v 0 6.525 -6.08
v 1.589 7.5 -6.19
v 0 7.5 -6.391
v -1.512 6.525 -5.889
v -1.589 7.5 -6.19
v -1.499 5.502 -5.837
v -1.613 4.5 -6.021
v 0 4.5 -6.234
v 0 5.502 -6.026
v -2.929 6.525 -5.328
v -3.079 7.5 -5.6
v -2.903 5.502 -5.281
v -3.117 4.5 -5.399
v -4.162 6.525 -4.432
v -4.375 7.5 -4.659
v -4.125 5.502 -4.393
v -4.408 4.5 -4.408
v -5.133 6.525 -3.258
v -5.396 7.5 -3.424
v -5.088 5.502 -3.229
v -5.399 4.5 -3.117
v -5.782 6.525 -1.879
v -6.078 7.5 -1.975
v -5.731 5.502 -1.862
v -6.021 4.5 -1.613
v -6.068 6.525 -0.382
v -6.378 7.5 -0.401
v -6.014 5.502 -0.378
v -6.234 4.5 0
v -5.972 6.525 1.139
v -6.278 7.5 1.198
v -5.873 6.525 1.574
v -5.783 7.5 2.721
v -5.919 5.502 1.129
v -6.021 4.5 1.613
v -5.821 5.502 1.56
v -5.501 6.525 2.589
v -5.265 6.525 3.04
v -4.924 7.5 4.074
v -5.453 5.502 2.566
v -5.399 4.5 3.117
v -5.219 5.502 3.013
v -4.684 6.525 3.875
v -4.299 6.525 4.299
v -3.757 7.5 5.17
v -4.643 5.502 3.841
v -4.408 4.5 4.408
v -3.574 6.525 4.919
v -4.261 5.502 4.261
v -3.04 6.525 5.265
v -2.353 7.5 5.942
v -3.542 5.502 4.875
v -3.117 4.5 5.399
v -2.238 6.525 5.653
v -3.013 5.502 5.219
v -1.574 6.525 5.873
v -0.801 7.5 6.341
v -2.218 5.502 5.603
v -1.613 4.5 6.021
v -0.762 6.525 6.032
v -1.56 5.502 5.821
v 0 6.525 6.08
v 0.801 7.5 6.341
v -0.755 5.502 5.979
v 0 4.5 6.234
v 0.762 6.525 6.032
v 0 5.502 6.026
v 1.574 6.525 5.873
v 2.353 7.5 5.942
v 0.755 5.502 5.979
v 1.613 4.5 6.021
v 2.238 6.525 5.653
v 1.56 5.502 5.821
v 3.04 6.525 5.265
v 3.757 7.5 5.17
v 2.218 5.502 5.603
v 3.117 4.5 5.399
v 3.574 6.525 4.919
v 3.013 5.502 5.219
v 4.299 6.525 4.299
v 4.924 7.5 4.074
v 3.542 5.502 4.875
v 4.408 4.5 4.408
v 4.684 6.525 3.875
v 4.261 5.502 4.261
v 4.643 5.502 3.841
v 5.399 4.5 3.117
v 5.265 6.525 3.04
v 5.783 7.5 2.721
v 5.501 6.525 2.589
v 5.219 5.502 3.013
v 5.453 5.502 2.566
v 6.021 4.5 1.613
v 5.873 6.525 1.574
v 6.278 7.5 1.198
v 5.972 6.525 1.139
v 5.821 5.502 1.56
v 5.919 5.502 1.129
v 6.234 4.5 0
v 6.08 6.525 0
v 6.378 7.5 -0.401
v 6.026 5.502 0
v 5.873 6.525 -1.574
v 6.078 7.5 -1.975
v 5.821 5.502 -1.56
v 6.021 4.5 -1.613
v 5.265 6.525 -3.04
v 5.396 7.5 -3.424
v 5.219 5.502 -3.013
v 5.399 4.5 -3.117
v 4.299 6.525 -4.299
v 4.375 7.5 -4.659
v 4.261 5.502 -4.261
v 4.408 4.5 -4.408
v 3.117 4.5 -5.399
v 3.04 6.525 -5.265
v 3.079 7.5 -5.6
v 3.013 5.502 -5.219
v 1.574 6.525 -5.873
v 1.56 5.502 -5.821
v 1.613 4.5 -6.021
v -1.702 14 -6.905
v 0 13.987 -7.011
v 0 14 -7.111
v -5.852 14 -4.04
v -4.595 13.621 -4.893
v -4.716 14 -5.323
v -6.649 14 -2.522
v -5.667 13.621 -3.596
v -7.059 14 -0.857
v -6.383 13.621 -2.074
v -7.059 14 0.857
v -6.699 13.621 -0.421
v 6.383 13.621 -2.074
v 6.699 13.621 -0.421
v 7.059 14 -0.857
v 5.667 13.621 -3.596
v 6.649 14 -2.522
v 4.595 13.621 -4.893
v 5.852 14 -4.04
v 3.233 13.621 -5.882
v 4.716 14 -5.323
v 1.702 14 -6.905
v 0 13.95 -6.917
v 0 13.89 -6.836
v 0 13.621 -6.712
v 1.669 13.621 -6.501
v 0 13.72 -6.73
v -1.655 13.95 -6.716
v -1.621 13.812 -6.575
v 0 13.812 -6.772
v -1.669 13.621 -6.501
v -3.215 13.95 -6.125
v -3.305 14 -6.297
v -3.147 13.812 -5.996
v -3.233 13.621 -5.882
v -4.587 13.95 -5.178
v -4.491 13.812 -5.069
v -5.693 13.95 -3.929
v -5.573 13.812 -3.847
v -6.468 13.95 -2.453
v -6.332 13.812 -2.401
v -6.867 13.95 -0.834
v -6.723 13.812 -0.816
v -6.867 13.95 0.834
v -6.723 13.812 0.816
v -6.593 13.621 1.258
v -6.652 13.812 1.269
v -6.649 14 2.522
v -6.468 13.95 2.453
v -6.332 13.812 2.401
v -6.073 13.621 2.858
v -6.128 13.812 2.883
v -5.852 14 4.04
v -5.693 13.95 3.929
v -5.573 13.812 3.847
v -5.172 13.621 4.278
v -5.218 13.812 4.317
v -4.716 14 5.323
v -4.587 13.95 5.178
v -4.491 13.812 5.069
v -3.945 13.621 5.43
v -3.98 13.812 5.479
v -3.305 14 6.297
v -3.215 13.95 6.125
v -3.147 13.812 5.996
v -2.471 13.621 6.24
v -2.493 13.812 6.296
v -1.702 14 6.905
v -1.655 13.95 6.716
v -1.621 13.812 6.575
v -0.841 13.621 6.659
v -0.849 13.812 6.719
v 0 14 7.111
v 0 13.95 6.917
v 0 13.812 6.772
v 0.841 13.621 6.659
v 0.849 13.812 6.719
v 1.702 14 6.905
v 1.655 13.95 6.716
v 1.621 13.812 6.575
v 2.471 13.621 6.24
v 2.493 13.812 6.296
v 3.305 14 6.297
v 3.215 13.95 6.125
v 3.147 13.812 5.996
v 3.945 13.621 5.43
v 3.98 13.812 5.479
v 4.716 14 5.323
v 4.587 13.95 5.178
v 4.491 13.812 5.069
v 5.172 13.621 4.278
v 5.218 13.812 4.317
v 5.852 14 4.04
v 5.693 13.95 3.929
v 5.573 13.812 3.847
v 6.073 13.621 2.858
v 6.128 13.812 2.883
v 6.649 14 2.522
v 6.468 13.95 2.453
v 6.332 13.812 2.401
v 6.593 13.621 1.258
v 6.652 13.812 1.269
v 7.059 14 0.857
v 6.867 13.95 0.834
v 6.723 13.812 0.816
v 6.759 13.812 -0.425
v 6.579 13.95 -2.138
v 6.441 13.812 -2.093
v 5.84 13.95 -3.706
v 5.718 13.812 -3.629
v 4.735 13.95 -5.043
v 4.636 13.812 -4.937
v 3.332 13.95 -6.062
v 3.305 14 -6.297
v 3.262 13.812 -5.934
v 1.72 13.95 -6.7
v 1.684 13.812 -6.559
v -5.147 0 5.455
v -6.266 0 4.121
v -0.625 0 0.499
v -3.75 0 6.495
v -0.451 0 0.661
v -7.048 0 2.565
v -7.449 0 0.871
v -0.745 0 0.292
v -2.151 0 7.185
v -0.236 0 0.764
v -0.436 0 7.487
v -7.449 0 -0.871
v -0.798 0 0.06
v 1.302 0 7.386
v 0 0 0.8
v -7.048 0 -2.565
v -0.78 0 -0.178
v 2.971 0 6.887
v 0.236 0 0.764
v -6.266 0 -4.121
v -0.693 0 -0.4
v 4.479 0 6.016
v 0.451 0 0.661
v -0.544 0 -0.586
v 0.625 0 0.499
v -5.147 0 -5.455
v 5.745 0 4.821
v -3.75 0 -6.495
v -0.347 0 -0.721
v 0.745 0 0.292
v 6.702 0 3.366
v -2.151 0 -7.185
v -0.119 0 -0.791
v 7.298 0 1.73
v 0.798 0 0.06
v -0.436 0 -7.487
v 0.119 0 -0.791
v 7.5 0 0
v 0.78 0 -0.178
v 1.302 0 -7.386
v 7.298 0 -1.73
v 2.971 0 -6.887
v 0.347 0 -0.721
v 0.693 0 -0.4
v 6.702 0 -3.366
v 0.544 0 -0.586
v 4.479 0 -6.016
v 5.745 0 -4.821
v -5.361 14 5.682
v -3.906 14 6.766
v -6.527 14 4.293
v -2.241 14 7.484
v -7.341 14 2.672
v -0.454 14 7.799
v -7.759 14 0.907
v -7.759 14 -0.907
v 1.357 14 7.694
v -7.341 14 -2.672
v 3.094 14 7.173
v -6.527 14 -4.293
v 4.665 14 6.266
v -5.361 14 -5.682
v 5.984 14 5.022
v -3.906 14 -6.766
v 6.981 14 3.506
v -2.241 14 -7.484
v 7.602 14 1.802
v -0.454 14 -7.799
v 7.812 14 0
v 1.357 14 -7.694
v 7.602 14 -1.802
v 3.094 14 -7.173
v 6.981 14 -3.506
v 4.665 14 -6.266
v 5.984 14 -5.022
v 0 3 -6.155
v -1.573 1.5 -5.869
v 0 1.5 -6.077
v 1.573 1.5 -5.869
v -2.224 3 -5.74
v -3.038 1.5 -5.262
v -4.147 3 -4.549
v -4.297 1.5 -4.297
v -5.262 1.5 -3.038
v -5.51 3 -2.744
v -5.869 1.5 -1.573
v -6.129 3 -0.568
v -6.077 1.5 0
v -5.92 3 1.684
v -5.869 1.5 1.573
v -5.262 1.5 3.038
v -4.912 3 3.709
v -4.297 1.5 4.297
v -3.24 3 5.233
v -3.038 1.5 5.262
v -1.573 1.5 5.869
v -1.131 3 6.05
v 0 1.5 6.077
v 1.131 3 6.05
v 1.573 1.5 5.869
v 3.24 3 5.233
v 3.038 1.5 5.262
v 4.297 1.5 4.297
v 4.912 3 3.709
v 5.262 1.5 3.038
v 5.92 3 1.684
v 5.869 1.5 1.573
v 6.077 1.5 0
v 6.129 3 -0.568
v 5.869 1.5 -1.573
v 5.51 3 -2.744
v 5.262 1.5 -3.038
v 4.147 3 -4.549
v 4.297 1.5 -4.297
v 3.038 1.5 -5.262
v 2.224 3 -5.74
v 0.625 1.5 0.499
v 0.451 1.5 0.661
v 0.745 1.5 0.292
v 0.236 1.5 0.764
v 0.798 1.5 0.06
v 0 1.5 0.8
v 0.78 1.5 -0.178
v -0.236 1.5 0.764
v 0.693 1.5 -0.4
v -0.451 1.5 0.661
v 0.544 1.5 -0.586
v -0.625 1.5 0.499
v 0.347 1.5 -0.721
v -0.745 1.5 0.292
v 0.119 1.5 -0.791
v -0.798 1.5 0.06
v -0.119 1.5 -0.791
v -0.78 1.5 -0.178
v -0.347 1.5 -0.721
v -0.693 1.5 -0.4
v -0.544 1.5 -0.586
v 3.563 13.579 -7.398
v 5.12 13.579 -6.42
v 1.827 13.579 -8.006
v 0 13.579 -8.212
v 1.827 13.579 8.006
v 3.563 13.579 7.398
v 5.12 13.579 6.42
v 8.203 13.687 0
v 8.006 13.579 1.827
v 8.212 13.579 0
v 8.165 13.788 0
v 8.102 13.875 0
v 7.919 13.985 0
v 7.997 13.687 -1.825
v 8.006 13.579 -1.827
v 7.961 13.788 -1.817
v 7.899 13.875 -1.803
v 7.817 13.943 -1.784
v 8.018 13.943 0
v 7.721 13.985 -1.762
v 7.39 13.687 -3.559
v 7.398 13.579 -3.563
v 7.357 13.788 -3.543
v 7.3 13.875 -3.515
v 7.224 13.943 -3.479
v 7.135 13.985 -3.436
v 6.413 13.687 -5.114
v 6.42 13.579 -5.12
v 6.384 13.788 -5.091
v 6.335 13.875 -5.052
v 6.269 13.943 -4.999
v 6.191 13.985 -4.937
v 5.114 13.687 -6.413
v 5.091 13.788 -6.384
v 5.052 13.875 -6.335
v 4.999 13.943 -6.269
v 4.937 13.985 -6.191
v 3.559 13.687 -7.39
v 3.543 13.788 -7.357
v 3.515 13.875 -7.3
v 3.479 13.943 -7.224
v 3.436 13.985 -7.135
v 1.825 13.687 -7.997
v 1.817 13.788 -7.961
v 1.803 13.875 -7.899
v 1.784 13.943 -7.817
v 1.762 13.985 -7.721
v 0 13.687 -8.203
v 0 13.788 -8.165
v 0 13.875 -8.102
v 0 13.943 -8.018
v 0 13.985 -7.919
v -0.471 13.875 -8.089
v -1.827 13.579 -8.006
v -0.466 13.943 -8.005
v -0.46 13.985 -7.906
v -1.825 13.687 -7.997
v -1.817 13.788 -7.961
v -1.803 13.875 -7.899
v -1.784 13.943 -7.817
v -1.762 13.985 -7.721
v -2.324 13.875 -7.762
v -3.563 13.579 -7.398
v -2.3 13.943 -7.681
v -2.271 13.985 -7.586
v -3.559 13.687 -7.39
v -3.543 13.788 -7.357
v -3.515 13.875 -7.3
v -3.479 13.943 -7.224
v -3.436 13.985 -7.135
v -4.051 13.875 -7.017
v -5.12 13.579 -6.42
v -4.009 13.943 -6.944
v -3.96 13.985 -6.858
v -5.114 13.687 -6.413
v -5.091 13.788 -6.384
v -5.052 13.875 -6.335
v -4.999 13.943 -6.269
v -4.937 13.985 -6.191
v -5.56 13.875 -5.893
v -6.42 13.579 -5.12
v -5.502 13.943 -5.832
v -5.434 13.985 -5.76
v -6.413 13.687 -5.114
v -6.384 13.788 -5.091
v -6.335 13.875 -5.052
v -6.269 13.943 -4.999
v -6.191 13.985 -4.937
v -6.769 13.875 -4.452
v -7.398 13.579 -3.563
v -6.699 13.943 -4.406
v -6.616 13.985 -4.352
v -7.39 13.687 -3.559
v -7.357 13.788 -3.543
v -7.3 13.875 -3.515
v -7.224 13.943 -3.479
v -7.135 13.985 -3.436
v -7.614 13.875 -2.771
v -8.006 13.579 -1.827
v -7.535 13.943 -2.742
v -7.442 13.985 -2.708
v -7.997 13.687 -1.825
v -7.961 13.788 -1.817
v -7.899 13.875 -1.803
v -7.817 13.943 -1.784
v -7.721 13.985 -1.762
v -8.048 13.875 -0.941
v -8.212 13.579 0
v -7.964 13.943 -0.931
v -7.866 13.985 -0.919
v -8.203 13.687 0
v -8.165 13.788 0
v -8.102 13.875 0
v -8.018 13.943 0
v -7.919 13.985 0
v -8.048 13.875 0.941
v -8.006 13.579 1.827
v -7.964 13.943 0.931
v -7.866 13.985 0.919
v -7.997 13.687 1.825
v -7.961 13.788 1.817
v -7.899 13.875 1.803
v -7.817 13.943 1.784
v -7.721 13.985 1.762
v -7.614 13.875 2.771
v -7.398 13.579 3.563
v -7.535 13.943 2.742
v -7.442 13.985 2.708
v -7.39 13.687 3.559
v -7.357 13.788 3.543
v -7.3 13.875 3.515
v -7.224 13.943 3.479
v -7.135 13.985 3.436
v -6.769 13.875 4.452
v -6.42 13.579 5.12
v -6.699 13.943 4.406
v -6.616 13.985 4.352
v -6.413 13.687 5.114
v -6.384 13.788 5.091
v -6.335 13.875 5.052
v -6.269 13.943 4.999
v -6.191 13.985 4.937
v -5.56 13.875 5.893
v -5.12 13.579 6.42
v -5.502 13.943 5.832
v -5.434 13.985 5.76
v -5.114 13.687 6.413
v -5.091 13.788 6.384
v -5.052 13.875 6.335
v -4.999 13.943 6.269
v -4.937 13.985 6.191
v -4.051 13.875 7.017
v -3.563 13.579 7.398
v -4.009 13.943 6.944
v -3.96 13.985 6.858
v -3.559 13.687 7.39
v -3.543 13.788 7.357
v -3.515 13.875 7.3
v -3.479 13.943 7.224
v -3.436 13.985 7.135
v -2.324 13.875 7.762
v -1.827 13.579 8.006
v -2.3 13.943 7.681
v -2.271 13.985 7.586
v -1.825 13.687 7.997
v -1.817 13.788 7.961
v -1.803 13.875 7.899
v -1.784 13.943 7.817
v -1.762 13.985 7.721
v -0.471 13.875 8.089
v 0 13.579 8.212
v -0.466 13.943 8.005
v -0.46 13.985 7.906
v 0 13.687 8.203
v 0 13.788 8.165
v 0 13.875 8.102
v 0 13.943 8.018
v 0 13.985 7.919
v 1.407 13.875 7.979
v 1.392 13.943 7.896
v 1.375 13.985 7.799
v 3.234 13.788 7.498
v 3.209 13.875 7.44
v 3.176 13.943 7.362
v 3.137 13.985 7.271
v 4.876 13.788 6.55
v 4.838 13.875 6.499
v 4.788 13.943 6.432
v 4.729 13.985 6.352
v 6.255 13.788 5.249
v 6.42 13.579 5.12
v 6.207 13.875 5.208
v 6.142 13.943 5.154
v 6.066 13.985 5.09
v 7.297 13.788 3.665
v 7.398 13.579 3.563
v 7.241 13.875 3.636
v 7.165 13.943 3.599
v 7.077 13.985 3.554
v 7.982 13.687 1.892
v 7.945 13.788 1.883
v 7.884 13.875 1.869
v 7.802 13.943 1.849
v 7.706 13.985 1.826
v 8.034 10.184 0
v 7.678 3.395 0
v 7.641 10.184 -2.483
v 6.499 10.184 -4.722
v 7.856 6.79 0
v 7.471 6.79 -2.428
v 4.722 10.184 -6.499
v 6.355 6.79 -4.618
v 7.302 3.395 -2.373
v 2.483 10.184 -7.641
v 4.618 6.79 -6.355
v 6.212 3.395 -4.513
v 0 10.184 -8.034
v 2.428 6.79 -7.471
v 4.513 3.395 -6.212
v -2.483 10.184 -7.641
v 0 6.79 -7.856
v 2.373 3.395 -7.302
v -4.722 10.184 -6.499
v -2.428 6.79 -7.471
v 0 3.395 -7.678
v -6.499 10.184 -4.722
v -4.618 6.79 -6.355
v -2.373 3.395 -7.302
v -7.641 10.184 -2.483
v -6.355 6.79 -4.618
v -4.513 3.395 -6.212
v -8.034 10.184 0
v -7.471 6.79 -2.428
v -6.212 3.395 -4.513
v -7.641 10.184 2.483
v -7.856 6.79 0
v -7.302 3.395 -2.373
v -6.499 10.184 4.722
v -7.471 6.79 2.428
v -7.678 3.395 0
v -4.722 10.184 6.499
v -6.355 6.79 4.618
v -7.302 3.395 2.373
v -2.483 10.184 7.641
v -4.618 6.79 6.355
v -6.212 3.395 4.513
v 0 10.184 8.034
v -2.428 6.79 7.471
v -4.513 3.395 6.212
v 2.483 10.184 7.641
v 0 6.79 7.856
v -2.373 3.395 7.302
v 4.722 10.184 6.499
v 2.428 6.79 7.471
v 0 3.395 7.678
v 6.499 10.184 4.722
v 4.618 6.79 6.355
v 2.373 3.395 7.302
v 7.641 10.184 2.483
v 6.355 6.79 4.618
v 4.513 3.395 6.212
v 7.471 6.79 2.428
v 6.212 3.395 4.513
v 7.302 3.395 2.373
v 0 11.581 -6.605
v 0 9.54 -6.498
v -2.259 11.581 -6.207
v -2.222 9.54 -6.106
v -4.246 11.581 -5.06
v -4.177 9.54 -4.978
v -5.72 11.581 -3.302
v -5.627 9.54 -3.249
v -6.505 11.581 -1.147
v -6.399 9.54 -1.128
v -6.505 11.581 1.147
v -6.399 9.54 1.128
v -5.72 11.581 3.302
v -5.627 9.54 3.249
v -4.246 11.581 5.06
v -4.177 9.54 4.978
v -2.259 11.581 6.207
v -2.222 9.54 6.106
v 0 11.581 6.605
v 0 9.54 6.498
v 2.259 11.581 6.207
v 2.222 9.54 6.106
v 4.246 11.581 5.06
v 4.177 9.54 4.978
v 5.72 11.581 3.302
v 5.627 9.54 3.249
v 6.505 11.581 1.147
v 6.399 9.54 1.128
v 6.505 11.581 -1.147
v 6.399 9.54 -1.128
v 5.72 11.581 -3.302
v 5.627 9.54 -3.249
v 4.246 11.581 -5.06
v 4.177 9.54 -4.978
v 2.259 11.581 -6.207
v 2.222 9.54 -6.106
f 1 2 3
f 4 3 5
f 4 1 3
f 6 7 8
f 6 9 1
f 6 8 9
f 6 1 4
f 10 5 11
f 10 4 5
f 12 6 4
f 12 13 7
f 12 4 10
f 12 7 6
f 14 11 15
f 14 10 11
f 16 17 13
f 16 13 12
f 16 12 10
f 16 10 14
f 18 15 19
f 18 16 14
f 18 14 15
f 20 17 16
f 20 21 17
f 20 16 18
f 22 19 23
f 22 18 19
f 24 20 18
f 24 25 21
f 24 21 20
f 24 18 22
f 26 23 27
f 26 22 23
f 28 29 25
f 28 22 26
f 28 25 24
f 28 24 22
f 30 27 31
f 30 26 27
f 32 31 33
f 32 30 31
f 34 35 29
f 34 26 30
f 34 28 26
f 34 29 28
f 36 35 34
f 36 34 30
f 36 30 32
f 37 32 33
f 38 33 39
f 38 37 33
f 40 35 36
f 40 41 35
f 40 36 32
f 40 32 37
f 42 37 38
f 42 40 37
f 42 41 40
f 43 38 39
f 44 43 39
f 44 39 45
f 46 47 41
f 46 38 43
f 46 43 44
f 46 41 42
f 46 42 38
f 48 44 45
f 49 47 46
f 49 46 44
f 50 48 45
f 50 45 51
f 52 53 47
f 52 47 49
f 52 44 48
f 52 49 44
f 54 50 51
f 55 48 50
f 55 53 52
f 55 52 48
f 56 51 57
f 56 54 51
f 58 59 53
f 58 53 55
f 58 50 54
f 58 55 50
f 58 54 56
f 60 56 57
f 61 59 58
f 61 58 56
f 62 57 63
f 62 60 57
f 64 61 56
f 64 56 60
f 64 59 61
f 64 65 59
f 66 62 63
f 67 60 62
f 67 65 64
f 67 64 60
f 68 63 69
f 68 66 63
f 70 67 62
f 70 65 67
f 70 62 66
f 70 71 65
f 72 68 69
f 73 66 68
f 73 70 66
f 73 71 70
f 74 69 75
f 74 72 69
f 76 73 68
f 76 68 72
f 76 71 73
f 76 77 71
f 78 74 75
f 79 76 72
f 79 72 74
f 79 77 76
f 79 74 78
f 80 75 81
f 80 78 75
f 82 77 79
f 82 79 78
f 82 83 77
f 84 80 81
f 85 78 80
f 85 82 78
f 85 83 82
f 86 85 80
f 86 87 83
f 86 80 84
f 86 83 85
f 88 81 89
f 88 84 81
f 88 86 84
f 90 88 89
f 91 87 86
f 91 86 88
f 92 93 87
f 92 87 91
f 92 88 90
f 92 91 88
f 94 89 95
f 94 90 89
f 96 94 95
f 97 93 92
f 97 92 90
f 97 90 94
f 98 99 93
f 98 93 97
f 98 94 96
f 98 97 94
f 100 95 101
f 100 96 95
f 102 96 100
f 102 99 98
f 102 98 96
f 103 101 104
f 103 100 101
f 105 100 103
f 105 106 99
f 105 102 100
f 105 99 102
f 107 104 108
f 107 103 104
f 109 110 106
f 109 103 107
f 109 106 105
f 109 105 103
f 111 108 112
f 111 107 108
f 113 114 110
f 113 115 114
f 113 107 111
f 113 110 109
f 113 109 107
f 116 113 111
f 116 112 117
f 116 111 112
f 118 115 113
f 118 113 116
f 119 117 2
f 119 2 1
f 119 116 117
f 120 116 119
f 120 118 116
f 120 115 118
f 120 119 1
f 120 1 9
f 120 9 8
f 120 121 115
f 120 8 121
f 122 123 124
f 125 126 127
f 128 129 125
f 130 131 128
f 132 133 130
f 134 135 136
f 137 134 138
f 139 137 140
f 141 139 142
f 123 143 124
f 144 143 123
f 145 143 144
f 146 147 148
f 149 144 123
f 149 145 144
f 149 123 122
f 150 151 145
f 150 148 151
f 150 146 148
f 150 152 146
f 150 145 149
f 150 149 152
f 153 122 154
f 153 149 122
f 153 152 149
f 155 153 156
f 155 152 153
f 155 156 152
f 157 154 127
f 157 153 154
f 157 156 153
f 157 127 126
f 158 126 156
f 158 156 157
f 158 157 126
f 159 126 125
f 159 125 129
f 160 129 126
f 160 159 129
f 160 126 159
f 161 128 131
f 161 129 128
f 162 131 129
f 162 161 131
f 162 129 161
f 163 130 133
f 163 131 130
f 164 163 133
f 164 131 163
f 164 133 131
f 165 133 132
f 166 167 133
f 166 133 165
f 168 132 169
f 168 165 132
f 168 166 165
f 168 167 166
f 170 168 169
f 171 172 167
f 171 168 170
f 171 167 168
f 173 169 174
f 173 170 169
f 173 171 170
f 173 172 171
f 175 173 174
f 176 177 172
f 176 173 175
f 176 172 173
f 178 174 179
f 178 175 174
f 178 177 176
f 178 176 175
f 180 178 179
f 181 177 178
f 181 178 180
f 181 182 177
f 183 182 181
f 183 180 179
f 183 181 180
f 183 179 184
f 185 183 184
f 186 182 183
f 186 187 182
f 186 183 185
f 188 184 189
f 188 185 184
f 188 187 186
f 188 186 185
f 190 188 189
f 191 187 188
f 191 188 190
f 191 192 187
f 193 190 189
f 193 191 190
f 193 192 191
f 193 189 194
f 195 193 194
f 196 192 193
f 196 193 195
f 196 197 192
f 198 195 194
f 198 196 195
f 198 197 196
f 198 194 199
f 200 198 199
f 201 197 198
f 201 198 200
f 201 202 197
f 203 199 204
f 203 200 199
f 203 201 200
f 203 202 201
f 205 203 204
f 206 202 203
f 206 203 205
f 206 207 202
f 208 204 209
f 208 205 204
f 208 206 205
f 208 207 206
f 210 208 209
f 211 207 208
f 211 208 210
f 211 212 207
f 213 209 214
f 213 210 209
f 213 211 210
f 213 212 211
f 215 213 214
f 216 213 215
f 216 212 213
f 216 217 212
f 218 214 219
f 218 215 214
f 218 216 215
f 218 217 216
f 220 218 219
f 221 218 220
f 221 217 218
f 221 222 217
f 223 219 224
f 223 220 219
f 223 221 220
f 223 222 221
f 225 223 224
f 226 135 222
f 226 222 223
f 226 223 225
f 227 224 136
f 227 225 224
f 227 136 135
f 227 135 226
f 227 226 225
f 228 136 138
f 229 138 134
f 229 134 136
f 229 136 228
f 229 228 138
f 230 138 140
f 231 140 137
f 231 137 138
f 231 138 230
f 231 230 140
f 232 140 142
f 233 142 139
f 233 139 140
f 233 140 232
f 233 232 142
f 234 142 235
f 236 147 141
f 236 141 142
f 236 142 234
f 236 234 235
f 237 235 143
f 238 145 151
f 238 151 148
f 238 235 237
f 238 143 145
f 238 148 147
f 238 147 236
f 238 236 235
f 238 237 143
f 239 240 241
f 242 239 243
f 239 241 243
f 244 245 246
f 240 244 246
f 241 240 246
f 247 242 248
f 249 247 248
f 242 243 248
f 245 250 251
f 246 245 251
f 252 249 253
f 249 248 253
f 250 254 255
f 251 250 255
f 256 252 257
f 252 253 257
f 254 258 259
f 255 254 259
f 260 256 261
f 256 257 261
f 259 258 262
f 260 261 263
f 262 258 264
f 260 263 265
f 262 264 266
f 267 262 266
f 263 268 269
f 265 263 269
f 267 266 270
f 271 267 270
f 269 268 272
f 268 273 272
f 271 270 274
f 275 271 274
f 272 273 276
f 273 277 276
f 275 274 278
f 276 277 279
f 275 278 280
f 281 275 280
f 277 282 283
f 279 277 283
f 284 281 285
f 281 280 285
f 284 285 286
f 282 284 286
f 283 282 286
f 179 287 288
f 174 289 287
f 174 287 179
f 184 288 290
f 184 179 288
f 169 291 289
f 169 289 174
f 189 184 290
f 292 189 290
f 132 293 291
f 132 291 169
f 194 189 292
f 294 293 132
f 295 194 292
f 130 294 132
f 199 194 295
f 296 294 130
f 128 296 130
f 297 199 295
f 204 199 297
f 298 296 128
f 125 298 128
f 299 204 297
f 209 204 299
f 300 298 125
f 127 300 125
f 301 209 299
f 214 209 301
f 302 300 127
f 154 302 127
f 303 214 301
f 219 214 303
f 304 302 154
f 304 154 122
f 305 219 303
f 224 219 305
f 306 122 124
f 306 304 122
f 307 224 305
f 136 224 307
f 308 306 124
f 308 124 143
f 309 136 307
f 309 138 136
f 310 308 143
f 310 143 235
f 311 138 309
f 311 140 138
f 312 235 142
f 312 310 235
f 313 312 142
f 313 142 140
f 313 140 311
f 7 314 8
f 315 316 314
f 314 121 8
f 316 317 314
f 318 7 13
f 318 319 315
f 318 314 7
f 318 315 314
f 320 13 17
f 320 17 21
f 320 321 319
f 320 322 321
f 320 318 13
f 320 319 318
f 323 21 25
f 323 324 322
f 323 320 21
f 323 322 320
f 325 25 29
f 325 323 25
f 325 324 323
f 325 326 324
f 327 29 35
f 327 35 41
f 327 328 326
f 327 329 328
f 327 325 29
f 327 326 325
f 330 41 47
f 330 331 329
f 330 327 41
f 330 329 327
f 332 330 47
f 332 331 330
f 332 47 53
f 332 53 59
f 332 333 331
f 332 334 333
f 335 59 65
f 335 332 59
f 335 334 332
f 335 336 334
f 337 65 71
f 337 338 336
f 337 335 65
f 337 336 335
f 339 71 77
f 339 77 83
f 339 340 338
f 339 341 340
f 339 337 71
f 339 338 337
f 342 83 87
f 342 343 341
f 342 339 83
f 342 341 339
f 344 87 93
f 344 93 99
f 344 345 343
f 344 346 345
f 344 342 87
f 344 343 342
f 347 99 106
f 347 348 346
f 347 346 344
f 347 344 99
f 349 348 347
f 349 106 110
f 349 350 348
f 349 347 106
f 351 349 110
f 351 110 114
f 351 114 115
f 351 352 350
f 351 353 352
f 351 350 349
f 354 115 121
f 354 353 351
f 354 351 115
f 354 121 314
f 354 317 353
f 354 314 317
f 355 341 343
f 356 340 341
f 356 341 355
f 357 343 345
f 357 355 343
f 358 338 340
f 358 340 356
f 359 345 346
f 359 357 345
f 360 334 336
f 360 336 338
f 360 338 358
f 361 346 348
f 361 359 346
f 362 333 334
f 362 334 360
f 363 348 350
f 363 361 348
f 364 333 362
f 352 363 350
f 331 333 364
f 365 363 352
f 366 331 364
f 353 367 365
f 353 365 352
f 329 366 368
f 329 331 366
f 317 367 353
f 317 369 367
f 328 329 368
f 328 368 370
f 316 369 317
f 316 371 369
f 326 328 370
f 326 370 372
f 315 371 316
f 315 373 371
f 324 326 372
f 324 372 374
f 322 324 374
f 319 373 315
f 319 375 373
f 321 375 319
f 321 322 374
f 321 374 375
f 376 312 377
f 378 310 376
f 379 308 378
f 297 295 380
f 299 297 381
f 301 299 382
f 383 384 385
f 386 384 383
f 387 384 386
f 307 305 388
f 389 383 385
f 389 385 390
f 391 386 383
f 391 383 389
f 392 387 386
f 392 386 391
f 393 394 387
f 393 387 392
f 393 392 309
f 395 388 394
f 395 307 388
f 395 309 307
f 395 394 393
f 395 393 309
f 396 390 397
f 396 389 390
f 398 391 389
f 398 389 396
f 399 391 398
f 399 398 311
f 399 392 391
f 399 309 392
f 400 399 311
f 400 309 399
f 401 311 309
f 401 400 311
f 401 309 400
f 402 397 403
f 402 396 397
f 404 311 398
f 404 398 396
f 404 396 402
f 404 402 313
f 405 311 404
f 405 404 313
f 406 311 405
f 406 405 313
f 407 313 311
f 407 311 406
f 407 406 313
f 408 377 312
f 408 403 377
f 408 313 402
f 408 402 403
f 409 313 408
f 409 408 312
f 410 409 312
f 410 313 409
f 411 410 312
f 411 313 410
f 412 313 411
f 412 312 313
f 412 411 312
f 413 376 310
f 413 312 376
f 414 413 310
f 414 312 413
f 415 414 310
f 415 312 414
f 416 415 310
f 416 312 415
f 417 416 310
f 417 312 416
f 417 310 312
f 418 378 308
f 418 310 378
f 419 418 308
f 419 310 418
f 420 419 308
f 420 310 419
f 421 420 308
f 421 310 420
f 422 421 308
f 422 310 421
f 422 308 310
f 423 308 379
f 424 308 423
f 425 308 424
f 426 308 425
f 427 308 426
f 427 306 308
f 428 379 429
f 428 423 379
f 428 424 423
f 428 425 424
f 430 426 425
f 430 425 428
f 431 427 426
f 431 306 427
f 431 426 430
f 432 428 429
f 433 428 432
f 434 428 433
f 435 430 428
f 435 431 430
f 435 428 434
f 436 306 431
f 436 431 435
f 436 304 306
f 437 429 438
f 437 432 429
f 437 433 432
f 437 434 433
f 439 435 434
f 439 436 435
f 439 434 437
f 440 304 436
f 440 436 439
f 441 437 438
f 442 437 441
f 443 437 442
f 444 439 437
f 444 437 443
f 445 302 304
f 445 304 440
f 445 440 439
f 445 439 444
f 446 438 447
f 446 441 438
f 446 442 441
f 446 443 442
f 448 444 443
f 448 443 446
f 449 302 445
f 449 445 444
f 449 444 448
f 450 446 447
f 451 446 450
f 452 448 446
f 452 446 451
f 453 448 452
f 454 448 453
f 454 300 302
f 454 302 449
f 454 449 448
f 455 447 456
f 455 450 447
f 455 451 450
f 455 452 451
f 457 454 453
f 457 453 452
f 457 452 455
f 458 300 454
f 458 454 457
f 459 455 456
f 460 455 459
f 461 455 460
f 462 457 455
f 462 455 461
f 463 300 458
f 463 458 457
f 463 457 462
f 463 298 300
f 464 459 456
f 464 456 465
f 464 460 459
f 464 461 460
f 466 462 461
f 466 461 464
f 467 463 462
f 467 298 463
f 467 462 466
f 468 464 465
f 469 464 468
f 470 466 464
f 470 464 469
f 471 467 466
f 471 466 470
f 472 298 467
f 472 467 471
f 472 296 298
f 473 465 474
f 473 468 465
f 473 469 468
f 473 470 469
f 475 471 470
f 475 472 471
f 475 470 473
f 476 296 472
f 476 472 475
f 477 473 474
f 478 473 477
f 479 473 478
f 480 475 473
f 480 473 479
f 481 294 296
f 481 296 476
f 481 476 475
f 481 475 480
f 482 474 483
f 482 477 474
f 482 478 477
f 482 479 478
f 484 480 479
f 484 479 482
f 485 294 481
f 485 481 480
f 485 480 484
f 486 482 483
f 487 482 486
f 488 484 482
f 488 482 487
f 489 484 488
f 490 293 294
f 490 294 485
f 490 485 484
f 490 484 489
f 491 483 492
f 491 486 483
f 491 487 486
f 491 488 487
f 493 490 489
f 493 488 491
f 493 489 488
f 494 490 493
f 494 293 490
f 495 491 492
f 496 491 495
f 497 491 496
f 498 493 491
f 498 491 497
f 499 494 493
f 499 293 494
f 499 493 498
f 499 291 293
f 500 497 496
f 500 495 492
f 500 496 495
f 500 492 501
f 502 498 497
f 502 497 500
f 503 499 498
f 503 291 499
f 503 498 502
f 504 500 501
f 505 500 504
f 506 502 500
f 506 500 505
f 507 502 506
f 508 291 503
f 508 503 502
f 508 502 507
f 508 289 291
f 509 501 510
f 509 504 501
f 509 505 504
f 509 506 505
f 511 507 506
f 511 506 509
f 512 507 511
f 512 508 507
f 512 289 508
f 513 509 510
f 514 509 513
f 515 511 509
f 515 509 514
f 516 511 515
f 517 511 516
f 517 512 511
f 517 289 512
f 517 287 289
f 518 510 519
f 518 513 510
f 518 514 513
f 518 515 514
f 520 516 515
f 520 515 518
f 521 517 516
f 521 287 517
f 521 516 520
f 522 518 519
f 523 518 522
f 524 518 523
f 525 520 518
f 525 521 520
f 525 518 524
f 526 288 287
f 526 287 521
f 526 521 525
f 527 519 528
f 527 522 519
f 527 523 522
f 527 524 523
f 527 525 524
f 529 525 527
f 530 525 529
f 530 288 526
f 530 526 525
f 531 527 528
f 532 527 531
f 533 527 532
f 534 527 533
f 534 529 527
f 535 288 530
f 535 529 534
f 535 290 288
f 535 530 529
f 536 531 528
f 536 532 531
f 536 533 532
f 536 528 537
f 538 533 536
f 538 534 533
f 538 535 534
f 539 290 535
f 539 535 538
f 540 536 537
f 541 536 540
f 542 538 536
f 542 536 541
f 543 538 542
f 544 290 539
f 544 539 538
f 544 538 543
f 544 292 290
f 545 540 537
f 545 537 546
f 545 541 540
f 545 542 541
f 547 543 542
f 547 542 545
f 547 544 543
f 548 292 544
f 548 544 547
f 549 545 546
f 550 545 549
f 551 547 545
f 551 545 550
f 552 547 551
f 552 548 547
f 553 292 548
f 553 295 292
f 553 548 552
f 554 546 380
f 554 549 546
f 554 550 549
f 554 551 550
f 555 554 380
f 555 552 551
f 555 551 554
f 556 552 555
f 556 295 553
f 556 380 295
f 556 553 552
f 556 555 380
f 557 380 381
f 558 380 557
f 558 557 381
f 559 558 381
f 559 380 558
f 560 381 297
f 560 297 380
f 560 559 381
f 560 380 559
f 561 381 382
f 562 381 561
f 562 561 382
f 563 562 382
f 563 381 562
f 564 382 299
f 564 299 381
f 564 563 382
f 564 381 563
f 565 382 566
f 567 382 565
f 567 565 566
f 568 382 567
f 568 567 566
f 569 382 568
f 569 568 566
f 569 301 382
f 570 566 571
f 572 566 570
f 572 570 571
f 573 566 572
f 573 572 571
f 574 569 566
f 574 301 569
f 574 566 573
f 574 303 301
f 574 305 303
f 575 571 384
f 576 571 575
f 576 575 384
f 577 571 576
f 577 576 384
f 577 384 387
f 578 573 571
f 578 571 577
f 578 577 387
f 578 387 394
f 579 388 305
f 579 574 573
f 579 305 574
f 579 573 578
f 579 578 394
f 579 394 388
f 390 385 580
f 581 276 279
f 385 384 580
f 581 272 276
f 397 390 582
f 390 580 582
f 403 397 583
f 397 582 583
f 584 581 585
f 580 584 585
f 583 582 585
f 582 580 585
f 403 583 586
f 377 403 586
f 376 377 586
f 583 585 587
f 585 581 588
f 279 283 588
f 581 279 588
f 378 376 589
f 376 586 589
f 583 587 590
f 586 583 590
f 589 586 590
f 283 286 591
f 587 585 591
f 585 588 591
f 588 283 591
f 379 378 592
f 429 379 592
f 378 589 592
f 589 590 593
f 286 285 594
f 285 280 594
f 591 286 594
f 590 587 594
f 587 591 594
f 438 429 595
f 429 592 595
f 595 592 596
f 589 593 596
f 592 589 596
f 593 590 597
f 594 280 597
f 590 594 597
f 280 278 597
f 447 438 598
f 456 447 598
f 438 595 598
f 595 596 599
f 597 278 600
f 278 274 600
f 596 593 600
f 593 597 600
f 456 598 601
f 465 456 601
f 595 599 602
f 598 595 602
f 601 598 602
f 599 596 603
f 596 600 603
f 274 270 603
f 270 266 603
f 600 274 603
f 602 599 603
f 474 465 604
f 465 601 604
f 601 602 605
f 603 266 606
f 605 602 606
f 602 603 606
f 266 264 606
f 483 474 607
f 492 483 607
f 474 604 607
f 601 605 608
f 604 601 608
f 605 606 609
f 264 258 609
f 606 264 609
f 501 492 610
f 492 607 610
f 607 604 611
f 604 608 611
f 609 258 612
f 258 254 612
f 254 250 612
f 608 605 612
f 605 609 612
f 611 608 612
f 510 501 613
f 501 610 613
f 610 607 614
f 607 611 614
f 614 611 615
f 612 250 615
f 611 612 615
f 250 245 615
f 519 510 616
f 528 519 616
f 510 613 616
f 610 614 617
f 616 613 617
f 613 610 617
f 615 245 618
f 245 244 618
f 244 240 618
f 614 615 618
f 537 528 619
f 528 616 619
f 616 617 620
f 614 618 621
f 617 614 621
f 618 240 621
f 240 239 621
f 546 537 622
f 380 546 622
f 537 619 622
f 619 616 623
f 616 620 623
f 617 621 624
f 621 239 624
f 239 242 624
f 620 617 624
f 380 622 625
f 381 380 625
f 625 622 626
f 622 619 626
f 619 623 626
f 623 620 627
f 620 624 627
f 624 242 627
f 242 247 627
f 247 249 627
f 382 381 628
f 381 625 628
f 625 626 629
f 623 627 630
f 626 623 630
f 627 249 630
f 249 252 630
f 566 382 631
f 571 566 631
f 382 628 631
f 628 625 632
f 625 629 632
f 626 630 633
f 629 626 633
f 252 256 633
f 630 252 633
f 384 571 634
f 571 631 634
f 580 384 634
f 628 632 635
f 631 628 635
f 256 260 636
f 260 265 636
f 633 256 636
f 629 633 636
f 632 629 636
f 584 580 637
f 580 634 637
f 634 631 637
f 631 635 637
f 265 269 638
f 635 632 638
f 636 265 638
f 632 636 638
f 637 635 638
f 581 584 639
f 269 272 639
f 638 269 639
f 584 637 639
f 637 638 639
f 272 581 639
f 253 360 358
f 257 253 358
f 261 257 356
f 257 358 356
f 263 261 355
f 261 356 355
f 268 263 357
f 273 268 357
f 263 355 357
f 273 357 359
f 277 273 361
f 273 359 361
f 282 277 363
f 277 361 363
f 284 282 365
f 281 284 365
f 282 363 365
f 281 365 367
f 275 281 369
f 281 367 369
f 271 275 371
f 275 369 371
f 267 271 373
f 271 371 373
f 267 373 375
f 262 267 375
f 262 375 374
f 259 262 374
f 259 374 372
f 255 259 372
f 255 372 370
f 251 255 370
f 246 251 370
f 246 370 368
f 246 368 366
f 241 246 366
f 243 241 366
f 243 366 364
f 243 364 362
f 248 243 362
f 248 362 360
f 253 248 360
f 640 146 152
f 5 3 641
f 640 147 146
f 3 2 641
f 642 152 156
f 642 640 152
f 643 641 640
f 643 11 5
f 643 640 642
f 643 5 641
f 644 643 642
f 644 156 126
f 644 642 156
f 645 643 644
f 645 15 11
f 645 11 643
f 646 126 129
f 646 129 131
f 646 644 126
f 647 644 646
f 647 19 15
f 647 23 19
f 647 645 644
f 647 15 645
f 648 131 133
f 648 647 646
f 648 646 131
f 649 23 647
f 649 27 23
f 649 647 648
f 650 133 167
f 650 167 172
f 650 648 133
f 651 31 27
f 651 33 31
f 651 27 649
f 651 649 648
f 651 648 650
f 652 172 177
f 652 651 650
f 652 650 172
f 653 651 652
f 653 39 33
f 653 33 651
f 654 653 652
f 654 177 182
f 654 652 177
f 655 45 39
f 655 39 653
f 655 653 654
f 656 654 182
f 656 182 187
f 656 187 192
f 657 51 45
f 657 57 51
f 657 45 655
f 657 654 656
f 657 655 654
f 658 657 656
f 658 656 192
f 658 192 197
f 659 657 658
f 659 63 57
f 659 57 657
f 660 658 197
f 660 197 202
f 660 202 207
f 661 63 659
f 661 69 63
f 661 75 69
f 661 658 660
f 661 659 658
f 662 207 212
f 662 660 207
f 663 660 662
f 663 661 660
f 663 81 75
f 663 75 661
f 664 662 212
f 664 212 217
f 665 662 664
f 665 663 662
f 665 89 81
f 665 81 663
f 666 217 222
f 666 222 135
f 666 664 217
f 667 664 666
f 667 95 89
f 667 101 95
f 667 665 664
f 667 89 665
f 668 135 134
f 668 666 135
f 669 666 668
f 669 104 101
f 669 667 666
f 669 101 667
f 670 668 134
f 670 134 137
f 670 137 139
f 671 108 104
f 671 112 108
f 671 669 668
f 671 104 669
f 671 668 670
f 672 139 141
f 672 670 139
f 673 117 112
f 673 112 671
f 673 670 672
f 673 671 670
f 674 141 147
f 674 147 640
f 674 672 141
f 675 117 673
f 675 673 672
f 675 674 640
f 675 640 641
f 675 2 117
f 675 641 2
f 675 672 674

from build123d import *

# Parameters (mm, degrees)
SKIZZE1_R                       = 7.5
AUFSATZ_LINEAR_AUSTRAGEN1_DEPTH = 14
AUFSATZ_LINEAR_AUSTRAGEN1_DRAFT = -3
SKIZZE3_R                       = 0.8
SCHNITT_LINEAR_AUSTRAGEN1_DEPTH = 18.083264466
VERRUNDUNG1_R                   = 0.4


with BuildPart() as part:
    # Skizze1 → Aufsatz-Linear austragen1 (with draft: the straight prism first)
    with BuildSketch(Plane(origin=(0, 0, 0), x_dir=(1, 0, 0), z_dir=(0, 1, 0))):
        Circle(SKIZZE1_R)
    extrude(amount=AUFSATZ_LINEAR_AUSTRAGEN1_DEPTH)
    # Aufsatz-Linear austragen1: the draft: its side faces are tilted about the plane it starts from
    aufsatz_linear_austragen1_sides = [part.faces().sort_by_distance(p)[0] for p in [
        (-7.5, 7, 0),
    ]]
    draft(aufsatz_linear_austragen1_sides, Plane(origin=(0, 0, 0), x_dir=(1, 0, 0), z_dir=(0, 1, 0)), AUFSATZ_LINEAR_AUSTRAGEN1_DRAFT)

    # Skizze2 → Schnitt-Rotation1 (revolve, cut)
    with BuildSketch(Plane.XY, mode=Mode.PRIVATE) as schnitt_rotation1_sk:
        with BuildLine():
            Line((-6.233776488, 4.5), (-6.07655315, 1.5))
            Line((-6.07655315, 1.5), (0, 1.5))
            Line((0, 1.5), (0, 14))
            Line((0, 14), (-6.731650391, 14))
            Line((-6.731650391, 14), (-6.390999826, 7.5))
            ThreePointArc((-6.390999826, 7.5), (-6.020055205, 6.015320521), (-6.233776488, 4.5))
        make_face()
    revolve(schnitt_rotation1_sk.sketch.rotate(Axis((0, 0, 0), (0, 1, 0)), 270), axis=Axis((0, 0, 0), (0, 1, 0)), mode=Mode.SUBTRACT)

    # Skizze3 → Schnitt-Linear austragen1 (cut, through all)
    with BuildSketch(Plane(origin=(0, 1.5, 0), x_dir=(1, 0, 0), z_dir=(0, 1, 0))):
        with Locations(Location((0, 0, 0), (0, 0, 270))):
            Circle(SKIZZE3_R)
    extrude(amount=-SCHNITT_LINEAR_AUSTRAGEN1_DEPTH, mode=Mode.SUBTRACT)

    # Verrundung1
    verrundung1_edges = [part.edges().sort_by_distance(p)[0] for p in [
        (-8.23370891, 14, 0),
        (0, 14, 6.731650391),
    ]]
    fillet(verrundung1_edges, radius=VERRUNDUNG1_R)


solid = part.part
